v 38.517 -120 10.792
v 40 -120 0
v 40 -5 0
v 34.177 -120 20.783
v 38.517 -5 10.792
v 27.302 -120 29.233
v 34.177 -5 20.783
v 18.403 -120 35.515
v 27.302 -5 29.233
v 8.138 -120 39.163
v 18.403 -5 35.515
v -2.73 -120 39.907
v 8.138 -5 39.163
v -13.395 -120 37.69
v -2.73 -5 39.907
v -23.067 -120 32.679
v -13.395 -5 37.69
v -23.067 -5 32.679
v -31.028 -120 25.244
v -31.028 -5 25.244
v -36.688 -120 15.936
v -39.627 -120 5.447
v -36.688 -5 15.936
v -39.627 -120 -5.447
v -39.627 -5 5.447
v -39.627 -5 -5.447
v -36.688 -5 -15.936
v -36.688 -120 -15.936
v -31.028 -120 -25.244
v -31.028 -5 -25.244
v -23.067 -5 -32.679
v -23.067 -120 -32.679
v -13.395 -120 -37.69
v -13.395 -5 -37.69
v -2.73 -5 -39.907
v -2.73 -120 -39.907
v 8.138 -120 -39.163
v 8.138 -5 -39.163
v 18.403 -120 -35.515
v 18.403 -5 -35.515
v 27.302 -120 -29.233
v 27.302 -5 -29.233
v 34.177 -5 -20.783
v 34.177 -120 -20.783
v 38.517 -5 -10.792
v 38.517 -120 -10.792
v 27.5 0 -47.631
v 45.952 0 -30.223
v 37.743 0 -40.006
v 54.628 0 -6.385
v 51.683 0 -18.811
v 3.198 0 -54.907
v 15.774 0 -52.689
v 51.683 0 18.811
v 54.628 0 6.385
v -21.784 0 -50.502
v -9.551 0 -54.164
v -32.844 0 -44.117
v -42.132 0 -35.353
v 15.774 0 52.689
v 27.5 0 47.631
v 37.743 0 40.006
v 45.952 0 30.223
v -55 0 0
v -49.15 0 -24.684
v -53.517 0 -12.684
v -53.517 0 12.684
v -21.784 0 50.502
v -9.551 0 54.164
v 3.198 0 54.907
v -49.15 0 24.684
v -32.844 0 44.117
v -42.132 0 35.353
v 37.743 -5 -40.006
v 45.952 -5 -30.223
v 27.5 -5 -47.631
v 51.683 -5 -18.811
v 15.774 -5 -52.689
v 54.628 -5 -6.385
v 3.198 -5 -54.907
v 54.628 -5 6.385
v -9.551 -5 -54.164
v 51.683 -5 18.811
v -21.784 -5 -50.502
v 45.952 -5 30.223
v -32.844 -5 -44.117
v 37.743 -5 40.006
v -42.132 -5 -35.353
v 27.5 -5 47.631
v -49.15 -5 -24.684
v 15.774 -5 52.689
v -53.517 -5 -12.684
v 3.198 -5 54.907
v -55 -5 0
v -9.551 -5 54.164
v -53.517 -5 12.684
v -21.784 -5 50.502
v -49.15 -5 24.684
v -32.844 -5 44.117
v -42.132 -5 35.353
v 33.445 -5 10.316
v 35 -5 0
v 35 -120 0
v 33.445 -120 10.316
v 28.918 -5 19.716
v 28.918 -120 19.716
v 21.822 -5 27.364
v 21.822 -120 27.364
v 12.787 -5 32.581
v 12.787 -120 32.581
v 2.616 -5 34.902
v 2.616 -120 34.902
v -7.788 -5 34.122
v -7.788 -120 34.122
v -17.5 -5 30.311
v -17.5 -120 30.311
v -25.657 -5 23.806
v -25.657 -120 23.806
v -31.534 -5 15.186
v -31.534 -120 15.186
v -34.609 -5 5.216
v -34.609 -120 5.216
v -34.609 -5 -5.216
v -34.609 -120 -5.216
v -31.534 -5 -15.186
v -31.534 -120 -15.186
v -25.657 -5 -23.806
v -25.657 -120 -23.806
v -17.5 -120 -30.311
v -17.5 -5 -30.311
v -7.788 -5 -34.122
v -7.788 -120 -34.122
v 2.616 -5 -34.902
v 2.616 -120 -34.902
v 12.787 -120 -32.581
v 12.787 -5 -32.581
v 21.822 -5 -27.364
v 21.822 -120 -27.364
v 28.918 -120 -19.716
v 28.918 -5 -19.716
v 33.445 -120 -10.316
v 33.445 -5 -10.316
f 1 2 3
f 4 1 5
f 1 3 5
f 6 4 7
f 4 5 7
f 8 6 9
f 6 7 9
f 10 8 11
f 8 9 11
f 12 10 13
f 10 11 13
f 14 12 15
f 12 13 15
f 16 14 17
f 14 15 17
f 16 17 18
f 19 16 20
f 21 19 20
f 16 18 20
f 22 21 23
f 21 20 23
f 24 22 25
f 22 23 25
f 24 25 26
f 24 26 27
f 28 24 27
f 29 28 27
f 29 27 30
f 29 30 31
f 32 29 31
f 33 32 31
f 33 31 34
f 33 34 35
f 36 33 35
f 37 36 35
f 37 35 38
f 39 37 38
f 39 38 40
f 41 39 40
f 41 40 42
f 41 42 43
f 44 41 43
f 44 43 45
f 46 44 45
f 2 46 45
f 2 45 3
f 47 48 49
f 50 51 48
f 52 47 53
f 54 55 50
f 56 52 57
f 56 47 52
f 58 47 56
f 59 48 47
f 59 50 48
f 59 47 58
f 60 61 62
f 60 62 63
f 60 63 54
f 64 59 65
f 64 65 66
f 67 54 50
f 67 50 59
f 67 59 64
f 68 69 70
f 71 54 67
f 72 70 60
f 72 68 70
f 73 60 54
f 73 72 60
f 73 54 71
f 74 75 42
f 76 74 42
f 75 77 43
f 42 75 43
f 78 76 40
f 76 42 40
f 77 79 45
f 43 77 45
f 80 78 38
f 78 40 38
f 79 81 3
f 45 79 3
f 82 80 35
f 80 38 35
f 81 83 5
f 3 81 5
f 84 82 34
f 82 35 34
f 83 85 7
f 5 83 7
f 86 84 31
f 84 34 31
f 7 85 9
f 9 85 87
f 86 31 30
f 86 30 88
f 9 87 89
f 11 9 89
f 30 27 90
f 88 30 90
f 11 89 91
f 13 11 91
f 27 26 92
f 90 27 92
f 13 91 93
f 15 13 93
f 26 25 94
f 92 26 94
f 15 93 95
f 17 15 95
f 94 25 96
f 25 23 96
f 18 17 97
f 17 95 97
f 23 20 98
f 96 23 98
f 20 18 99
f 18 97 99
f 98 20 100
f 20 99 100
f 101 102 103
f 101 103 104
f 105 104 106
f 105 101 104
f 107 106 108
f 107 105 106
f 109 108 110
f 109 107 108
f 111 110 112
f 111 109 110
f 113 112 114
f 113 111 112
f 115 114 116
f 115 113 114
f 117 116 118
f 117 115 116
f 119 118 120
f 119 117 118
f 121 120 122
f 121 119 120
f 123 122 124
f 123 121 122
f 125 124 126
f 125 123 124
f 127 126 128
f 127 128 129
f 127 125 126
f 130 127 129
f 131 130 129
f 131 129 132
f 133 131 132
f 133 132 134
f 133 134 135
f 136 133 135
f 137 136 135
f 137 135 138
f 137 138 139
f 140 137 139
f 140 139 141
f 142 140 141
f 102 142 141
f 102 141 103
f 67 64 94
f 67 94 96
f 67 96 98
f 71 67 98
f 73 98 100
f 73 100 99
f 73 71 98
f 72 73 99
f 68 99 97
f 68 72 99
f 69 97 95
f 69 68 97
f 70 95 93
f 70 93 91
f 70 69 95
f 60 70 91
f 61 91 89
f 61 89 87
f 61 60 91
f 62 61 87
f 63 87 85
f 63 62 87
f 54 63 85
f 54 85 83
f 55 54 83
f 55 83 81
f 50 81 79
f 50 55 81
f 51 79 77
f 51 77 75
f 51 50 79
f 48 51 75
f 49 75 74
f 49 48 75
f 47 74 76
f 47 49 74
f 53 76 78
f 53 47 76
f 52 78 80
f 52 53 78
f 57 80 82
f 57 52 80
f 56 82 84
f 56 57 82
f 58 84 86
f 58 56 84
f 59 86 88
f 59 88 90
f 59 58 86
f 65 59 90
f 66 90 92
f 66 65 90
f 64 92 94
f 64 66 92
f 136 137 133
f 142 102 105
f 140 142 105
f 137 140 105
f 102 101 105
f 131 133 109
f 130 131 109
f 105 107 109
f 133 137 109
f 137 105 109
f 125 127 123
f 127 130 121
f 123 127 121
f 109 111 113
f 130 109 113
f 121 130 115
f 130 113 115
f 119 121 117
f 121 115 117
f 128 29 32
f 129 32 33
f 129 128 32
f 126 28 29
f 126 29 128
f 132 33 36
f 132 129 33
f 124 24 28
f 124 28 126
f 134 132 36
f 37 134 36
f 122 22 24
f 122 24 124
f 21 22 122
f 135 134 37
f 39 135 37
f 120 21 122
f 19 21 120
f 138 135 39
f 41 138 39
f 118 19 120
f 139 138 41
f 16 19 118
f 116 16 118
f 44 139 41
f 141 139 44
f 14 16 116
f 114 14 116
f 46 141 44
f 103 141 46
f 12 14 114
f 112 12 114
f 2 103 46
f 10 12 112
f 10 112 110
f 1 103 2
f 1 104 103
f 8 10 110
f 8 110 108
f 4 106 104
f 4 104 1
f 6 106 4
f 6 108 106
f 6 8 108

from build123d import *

# Parameters (mm, degrees)
F0_R     = 40
F0_R_2   = 35
F1_DEPTH = 120
F2_R     = 55
F2_R_2   = 40
F2_R_3   = 35
F3_DEPTH = 5


with BuildPart() as f1:
    # F0 (on Front) → F1 (new body)
    with BuildSketch(Plane.XZ):
        Circle(F0_R)
        Circle(F0_R_2, mode=Mode.SUBTRACT)
    extrude(amount=F1_DEPTH)

    # F2 (on face) → F3 (join)
    with BuildSketch(Plane(origin=(0, 0, 0), x_dir=(-1, 0, 0), z_dir=(0, 1, 0))):
        Circle(F2_R)
        Circle(F2_R_2, mode=Mode.SUBTRACT)
        Circle(F2_R_2)
        Circle(F2_R_3, mode=Mode.SUBTRACT)
        Circle(F2_R_3)
    extrude(amount=-F3_DEPTH)


solid = f1.part
